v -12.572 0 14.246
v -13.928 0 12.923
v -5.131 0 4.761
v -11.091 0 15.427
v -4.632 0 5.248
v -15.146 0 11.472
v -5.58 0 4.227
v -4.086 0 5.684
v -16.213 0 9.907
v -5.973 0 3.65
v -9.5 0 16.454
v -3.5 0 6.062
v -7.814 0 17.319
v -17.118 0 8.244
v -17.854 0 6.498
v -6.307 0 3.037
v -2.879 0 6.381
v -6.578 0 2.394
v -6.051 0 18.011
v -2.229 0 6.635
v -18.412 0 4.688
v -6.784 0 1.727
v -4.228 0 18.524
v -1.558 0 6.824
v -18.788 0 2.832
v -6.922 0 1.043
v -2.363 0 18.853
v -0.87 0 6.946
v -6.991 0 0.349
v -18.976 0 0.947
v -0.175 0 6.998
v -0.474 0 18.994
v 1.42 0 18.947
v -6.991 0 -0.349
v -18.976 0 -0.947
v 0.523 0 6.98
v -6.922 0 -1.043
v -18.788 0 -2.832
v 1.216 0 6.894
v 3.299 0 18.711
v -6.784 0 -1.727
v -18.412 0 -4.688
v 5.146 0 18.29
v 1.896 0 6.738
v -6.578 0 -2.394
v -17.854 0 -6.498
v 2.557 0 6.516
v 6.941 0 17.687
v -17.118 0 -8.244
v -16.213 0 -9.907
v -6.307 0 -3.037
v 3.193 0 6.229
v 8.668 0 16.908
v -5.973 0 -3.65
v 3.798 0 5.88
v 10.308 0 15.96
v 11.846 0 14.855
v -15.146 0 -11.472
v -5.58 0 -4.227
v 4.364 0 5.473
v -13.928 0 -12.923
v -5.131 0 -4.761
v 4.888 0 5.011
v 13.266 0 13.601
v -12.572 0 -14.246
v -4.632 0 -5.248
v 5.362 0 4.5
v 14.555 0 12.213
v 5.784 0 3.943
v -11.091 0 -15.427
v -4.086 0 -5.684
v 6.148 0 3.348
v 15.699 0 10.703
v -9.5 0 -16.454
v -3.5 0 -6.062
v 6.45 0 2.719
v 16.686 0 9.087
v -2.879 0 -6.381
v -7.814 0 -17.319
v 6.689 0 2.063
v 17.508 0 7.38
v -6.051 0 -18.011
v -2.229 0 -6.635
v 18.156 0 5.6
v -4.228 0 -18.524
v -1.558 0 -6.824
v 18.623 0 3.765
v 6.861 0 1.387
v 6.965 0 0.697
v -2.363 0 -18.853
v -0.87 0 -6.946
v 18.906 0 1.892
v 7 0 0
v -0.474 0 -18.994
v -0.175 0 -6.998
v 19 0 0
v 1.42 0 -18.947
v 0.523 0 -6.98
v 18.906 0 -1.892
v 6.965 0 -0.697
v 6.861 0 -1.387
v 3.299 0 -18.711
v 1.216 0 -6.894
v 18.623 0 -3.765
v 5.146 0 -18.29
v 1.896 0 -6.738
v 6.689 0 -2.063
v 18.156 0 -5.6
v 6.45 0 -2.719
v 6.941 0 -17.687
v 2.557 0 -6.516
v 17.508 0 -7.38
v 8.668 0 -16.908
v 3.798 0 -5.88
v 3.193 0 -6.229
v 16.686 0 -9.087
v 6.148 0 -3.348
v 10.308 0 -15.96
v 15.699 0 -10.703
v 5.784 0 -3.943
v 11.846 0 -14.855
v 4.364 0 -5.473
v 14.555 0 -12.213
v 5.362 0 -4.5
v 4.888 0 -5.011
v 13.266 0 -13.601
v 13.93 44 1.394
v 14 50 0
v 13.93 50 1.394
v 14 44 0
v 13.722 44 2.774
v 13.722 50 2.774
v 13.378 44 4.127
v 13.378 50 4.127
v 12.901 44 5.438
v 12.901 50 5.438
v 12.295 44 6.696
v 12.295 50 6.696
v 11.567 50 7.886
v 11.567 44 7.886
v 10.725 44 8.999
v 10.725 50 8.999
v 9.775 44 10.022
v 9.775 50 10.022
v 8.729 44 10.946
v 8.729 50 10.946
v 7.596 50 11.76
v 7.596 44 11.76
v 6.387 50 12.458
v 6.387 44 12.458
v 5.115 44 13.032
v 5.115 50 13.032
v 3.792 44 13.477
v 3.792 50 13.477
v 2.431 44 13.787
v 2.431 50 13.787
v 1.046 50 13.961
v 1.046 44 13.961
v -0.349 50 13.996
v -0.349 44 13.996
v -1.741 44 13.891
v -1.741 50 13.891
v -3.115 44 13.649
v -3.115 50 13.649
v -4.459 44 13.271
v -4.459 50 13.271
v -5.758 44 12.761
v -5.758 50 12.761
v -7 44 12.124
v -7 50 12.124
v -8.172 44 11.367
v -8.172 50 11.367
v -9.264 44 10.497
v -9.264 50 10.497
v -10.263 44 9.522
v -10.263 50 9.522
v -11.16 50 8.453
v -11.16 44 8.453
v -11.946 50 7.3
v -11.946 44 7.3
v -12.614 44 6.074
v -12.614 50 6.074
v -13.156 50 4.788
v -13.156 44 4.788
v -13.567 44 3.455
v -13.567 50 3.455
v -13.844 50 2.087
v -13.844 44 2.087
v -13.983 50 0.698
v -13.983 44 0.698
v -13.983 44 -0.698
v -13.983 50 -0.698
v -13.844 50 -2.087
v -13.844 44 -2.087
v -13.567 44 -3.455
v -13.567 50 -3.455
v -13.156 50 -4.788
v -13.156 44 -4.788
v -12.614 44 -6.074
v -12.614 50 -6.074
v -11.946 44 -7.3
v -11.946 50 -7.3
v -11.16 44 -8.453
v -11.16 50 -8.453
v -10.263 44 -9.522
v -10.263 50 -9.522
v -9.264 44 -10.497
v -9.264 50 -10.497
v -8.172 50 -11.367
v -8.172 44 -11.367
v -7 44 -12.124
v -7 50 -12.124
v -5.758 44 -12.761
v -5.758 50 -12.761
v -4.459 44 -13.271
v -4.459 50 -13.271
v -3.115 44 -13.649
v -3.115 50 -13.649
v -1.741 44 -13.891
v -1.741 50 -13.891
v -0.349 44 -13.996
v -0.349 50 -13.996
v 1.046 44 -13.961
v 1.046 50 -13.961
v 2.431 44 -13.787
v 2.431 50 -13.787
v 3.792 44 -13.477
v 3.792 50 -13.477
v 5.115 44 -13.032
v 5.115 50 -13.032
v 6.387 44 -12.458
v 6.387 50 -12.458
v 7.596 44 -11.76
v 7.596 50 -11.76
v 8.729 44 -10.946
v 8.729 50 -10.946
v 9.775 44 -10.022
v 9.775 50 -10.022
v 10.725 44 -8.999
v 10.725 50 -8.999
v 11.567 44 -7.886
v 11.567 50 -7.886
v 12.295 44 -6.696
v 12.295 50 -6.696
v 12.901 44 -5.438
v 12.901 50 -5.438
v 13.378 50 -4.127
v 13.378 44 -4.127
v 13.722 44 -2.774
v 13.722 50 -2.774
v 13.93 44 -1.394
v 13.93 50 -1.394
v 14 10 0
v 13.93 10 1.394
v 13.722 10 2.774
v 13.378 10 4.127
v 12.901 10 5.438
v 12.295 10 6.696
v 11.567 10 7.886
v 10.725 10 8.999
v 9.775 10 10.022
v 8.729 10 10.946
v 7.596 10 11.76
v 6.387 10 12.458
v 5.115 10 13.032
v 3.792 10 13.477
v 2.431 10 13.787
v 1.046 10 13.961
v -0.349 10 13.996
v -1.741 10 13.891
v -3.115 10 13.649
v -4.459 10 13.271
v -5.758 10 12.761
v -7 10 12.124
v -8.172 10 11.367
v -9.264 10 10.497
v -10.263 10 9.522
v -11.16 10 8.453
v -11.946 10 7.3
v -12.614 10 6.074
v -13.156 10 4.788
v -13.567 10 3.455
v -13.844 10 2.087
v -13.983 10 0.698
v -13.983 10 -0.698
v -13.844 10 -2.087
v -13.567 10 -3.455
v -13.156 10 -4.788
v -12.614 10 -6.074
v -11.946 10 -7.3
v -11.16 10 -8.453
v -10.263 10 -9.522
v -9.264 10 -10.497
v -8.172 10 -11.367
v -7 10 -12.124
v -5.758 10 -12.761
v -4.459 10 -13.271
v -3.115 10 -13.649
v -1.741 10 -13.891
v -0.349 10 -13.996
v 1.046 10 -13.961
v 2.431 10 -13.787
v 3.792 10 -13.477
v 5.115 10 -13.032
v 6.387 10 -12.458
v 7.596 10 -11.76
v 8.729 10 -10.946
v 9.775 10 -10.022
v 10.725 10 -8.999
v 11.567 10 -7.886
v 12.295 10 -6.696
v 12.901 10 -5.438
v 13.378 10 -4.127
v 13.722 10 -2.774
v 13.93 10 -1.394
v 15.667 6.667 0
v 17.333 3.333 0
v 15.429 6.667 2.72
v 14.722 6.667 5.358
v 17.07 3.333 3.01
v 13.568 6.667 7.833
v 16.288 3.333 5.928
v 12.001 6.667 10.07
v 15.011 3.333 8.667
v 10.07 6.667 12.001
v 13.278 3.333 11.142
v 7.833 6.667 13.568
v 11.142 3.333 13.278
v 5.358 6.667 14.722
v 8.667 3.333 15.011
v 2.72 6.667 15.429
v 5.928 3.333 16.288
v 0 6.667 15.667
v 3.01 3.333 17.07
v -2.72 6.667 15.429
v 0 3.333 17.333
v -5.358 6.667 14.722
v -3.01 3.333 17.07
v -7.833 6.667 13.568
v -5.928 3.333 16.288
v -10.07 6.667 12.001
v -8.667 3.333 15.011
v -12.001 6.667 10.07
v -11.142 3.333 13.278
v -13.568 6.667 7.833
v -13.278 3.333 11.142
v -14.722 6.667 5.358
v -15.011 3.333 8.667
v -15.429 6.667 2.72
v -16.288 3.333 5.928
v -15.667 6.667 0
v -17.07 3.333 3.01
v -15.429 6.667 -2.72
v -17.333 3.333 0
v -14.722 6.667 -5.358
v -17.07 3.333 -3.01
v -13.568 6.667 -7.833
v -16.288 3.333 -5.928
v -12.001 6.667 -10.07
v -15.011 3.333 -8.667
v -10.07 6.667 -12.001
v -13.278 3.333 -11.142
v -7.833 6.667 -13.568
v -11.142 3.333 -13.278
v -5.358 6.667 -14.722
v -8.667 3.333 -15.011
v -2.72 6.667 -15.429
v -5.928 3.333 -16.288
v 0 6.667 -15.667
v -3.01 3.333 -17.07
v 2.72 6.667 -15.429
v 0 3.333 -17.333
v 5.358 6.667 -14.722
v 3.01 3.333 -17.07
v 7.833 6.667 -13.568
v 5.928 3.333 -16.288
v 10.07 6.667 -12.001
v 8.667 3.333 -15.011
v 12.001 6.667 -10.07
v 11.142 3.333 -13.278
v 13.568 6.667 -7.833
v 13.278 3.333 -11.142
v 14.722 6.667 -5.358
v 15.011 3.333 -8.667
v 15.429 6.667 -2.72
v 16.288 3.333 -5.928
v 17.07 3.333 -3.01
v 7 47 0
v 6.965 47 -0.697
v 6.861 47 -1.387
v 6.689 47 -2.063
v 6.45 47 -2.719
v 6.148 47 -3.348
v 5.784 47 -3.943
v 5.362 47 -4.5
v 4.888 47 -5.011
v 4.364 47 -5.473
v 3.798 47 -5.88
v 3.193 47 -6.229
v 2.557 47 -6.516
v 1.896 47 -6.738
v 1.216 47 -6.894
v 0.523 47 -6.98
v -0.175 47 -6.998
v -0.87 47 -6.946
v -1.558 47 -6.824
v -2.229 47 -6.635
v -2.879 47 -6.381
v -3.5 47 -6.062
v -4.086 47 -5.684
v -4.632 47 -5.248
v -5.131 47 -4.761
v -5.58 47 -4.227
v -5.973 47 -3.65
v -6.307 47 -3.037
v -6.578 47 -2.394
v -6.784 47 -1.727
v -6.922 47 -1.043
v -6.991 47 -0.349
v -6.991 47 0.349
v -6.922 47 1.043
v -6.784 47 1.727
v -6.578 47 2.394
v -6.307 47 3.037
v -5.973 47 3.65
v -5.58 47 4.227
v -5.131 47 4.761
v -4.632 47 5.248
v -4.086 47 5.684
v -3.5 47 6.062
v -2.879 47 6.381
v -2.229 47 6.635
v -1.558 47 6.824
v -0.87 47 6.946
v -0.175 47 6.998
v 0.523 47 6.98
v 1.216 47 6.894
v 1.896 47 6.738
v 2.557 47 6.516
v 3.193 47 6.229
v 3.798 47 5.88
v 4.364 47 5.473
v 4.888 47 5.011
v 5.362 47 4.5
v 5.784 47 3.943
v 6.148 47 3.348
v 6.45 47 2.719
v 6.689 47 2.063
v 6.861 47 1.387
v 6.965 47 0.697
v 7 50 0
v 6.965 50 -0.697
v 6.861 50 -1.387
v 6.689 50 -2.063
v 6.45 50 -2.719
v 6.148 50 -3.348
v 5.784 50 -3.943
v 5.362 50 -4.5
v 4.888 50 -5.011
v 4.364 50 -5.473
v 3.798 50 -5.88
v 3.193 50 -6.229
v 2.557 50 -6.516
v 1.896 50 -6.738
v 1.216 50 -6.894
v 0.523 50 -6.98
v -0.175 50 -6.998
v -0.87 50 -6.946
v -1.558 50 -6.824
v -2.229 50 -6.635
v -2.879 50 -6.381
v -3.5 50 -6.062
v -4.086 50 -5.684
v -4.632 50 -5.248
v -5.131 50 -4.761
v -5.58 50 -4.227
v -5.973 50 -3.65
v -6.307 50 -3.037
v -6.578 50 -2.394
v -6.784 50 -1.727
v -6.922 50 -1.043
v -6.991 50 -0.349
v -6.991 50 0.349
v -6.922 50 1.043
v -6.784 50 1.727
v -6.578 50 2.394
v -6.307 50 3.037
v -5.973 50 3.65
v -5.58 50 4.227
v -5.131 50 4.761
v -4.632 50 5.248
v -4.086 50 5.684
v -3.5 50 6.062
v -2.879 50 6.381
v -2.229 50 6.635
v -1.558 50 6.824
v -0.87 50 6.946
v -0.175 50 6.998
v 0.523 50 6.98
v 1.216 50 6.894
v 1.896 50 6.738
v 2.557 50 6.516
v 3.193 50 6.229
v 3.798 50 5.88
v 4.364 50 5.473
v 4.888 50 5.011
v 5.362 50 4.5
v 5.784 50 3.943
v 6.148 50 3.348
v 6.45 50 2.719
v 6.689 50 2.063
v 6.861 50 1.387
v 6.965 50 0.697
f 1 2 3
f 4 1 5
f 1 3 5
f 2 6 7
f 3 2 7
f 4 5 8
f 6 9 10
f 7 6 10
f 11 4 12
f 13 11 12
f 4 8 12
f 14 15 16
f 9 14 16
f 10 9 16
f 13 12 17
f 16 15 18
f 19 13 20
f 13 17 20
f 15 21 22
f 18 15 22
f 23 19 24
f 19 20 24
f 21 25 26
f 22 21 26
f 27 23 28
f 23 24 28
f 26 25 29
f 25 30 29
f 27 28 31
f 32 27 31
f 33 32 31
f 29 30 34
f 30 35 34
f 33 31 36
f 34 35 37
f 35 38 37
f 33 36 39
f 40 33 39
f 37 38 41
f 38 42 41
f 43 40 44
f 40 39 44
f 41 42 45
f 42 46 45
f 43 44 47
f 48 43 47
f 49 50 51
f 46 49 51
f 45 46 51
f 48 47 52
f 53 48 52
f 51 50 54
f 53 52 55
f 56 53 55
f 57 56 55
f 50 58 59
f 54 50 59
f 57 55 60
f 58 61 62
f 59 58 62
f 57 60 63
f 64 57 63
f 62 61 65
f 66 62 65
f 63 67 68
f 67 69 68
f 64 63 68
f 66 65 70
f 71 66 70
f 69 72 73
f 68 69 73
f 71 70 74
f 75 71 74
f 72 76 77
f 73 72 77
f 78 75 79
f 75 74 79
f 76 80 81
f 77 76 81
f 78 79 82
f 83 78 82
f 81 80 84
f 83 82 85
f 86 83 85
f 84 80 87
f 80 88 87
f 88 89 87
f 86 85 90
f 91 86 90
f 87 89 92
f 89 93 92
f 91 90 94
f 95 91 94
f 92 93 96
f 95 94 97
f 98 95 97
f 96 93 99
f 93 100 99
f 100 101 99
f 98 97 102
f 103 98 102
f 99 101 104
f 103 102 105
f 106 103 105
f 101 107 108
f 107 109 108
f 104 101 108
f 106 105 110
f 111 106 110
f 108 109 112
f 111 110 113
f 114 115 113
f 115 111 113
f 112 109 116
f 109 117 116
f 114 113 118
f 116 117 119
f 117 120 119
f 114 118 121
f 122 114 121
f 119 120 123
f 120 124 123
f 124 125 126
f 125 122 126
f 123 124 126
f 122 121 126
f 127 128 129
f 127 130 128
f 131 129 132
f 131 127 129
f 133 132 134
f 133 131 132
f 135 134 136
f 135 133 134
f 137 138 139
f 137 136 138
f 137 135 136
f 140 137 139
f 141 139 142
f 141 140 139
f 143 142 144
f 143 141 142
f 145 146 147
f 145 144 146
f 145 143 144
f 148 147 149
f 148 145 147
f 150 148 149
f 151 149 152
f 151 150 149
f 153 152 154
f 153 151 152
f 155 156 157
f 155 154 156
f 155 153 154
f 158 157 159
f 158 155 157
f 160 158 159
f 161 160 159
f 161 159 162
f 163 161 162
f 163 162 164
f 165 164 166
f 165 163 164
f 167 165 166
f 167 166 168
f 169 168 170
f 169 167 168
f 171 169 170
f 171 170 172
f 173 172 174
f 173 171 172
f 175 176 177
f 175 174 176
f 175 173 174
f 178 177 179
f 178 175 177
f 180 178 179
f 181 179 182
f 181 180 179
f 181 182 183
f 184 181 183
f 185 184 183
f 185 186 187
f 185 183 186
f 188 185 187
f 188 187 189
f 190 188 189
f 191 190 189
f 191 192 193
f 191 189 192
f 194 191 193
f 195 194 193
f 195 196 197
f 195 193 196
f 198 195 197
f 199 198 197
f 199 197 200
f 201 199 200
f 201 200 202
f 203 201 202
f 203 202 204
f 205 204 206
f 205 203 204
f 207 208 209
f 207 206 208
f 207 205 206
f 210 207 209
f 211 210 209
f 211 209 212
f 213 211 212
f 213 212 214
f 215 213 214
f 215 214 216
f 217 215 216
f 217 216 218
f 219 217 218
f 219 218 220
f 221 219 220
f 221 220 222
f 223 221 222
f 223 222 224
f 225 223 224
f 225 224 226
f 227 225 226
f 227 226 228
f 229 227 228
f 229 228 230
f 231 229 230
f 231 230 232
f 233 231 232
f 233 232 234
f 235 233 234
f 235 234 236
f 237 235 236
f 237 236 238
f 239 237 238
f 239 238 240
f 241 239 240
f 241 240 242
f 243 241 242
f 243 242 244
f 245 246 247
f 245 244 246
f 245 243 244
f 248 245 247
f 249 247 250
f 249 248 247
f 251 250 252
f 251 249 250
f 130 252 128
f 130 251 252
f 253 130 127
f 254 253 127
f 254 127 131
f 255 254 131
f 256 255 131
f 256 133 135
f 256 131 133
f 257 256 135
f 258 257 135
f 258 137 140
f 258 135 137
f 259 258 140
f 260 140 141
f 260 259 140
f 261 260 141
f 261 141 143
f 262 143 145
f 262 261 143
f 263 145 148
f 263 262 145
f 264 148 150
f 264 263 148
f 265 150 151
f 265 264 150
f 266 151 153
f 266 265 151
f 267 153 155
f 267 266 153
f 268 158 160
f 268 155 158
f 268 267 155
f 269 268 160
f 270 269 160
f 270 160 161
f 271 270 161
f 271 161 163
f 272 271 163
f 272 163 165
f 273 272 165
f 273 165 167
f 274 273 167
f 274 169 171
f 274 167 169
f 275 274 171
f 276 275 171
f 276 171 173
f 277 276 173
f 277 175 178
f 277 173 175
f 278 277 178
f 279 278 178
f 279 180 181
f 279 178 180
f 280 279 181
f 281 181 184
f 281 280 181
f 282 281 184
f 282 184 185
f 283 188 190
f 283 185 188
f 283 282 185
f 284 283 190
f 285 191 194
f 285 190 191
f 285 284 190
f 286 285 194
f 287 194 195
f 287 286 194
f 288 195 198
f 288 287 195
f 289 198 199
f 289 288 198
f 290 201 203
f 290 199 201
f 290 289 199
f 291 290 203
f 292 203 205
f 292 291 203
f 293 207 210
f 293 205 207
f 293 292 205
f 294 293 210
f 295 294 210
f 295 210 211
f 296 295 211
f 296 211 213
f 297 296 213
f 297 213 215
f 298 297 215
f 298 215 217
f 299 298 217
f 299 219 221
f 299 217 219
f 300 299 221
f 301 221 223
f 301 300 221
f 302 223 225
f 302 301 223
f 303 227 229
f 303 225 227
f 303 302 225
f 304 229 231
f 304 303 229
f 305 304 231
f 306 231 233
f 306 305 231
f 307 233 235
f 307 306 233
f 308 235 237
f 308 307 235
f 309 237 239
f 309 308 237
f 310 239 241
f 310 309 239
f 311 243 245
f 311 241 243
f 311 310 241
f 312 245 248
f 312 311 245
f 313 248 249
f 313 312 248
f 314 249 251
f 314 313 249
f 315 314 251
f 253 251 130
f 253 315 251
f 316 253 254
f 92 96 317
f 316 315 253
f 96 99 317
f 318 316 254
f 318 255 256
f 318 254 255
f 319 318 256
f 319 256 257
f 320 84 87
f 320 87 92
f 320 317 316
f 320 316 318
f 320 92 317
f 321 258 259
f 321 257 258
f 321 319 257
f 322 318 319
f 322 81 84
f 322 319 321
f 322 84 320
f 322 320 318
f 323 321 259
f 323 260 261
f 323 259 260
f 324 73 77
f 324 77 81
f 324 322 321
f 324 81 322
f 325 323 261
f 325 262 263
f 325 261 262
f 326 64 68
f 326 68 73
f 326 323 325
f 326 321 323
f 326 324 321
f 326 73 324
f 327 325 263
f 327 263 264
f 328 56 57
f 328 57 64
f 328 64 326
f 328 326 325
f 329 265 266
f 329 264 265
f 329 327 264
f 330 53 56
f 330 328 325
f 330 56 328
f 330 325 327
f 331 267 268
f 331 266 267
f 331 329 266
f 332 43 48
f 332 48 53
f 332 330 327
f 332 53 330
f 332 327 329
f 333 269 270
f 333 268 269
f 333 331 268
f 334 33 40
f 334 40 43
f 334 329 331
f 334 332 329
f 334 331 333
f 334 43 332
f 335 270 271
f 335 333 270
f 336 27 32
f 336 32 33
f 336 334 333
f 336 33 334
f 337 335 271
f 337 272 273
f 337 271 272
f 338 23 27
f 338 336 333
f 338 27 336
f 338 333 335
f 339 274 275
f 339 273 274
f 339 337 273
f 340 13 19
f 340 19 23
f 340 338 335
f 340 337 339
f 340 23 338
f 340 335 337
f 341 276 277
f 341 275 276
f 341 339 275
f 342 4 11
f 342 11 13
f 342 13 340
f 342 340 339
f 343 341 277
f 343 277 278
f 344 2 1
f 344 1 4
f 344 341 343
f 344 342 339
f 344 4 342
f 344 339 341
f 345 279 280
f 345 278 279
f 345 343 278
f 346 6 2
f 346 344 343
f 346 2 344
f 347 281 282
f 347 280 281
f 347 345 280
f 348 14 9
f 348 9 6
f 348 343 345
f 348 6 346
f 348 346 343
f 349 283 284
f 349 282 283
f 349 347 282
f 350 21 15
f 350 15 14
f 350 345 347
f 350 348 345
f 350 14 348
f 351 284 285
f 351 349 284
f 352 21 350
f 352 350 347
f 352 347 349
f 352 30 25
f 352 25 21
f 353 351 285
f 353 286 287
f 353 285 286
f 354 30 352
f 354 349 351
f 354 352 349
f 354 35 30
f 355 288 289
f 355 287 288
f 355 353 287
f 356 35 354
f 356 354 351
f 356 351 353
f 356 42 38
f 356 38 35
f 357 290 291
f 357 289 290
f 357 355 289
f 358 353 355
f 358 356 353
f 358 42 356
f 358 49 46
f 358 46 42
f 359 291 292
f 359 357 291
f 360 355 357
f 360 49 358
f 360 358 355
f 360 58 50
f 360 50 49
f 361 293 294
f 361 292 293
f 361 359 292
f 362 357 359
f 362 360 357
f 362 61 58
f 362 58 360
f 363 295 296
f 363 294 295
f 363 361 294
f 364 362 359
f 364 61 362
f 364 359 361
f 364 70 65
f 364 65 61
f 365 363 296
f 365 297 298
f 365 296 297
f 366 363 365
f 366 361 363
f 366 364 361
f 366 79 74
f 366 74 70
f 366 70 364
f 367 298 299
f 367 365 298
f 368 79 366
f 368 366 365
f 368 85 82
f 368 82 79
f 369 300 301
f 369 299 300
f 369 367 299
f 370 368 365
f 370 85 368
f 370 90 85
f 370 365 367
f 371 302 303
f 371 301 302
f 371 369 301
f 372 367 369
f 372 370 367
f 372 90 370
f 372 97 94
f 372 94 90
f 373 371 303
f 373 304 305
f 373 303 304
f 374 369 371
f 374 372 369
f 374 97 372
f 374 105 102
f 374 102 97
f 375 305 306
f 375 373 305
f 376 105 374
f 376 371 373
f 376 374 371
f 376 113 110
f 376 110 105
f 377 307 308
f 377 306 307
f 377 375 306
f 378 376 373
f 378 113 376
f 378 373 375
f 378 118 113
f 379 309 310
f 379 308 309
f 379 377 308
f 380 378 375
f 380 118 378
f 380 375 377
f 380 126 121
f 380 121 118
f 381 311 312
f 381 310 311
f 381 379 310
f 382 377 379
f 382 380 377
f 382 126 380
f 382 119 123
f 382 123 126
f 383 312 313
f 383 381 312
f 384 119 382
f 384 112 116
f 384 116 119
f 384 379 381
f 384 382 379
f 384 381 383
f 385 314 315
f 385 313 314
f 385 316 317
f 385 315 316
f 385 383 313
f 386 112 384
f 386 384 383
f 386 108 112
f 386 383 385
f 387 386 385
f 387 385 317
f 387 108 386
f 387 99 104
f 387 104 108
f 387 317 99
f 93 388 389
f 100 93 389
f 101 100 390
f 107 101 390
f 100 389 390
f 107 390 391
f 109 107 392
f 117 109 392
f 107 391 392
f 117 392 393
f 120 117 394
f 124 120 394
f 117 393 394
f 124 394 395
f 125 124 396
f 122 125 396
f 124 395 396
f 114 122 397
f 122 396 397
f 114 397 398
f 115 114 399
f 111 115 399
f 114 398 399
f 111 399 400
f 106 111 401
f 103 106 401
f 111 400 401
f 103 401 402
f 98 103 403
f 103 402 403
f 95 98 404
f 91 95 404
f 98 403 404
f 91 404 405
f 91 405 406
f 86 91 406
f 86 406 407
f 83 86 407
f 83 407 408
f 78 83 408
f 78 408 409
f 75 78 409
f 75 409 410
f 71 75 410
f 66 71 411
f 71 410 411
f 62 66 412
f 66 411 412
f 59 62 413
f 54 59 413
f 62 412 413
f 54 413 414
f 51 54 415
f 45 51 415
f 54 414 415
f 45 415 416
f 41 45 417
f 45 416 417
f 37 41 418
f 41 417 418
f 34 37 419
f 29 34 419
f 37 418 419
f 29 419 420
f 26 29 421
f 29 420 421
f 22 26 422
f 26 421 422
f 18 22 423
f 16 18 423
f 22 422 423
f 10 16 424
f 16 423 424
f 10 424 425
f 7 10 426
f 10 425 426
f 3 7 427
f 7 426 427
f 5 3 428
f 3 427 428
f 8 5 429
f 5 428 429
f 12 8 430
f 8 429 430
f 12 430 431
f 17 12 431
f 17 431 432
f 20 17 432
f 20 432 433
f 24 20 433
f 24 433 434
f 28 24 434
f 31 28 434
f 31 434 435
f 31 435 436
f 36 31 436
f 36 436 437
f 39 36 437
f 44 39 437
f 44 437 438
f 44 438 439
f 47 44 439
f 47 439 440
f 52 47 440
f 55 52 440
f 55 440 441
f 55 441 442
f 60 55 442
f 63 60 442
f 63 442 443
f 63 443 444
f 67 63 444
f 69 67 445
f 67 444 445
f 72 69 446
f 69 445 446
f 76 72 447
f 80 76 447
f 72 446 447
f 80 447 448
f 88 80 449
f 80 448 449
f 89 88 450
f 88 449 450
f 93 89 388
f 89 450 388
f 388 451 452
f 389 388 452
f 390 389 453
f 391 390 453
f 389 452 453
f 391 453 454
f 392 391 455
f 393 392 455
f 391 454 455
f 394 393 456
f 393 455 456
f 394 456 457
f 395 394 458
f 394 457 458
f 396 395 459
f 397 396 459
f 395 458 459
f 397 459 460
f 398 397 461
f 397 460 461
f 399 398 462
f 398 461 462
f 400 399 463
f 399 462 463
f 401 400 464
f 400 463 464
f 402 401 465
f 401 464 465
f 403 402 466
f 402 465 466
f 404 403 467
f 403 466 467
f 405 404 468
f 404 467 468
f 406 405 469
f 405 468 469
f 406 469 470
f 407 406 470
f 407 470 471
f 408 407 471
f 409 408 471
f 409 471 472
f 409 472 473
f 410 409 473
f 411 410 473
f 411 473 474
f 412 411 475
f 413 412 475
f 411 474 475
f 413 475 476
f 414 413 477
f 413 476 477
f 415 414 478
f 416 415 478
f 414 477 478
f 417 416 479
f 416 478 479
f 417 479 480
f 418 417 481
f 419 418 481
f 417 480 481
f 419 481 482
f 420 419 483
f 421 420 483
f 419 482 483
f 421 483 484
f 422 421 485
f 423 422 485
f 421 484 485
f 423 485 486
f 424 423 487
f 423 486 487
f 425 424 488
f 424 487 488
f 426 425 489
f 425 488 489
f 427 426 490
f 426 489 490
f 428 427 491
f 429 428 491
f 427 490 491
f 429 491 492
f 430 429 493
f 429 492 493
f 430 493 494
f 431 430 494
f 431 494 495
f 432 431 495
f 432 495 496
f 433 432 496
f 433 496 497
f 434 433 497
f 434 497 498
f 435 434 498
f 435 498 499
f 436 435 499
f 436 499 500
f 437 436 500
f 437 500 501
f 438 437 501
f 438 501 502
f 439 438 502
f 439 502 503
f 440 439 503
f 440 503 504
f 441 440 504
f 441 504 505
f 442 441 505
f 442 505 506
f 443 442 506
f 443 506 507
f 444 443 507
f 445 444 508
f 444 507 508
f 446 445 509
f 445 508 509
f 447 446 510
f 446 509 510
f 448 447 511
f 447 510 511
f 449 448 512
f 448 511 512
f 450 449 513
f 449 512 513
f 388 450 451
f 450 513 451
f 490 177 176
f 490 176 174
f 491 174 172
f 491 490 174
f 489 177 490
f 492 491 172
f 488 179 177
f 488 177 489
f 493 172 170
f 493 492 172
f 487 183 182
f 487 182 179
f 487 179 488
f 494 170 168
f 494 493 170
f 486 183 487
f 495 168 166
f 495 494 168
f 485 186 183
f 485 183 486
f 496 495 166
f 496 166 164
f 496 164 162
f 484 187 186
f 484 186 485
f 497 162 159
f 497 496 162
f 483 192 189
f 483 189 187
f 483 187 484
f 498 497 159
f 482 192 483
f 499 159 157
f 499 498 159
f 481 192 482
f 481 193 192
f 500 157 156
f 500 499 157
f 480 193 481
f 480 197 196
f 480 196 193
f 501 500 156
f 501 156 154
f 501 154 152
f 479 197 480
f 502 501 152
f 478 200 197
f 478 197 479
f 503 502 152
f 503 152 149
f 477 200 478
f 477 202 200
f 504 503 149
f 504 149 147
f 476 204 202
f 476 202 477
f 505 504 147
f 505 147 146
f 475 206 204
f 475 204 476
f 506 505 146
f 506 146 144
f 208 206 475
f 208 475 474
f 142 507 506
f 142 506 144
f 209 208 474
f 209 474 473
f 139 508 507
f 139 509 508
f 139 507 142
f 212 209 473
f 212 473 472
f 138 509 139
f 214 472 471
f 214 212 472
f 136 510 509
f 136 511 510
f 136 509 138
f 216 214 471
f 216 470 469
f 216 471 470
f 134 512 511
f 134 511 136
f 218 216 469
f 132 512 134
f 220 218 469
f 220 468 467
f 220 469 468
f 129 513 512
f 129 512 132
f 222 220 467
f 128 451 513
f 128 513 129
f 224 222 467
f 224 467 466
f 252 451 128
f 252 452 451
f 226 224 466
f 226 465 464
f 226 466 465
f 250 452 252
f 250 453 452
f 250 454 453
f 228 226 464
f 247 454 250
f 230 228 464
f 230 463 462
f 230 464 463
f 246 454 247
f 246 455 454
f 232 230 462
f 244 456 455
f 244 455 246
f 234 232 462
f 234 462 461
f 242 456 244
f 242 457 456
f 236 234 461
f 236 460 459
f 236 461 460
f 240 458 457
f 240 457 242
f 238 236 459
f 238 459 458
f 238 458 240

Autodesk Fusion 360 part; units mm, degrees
sketch "Sketch1" plane through (0, 0, 0) normal (0, 0, 1) x (1, 0, 0)
  line L0 (0, 0) -> (0, 50) construction
  line L1 (7, 50) -> (14, 50)
  line L2 (14, 50) -> (14, 10)
  line L3 (14, 10) -> (19, 0)
  line L4 (19, 0) -> (7, 0)
  line L5 (7, 0) -> (7, 50)
  line L6 (0, 47) -> (7, 47)
  line L7 (7, 47) -> (7, 50)
  line L8 (7, 50) -> (14, 50)
  line L9 (14, 50) -> (14, 44)
  line L10 (14, 44) -> (20, 44)
  line L11 (20, 44) -> (20, 47)
  arc A0 (20, 47) -> (10, 57) centre (10, 47) ccw
  line L12 (10, 57) -> (0, 57)
  line L13 (0, 57) -> (0, 47)
  dimension "d1" = 50
  dimension "d2" = 7
  dimension "d3" = 14
  dimension "d4" = 12
  dimension "d5" = 10
  dimension "d7" = 3
  dimension "d8" = 6
  dimension "d9" = 3
  dimension "d10" = 10
  dimension "d11" = 10
  dimension "d12" = 20
revolve "Revolve1" add sketch "Sketch1" angle 360 about axis through (0, 0, 0) along (0, 1, 0) contours L1 L2 L3 L4 L5 L7 L8 L9
